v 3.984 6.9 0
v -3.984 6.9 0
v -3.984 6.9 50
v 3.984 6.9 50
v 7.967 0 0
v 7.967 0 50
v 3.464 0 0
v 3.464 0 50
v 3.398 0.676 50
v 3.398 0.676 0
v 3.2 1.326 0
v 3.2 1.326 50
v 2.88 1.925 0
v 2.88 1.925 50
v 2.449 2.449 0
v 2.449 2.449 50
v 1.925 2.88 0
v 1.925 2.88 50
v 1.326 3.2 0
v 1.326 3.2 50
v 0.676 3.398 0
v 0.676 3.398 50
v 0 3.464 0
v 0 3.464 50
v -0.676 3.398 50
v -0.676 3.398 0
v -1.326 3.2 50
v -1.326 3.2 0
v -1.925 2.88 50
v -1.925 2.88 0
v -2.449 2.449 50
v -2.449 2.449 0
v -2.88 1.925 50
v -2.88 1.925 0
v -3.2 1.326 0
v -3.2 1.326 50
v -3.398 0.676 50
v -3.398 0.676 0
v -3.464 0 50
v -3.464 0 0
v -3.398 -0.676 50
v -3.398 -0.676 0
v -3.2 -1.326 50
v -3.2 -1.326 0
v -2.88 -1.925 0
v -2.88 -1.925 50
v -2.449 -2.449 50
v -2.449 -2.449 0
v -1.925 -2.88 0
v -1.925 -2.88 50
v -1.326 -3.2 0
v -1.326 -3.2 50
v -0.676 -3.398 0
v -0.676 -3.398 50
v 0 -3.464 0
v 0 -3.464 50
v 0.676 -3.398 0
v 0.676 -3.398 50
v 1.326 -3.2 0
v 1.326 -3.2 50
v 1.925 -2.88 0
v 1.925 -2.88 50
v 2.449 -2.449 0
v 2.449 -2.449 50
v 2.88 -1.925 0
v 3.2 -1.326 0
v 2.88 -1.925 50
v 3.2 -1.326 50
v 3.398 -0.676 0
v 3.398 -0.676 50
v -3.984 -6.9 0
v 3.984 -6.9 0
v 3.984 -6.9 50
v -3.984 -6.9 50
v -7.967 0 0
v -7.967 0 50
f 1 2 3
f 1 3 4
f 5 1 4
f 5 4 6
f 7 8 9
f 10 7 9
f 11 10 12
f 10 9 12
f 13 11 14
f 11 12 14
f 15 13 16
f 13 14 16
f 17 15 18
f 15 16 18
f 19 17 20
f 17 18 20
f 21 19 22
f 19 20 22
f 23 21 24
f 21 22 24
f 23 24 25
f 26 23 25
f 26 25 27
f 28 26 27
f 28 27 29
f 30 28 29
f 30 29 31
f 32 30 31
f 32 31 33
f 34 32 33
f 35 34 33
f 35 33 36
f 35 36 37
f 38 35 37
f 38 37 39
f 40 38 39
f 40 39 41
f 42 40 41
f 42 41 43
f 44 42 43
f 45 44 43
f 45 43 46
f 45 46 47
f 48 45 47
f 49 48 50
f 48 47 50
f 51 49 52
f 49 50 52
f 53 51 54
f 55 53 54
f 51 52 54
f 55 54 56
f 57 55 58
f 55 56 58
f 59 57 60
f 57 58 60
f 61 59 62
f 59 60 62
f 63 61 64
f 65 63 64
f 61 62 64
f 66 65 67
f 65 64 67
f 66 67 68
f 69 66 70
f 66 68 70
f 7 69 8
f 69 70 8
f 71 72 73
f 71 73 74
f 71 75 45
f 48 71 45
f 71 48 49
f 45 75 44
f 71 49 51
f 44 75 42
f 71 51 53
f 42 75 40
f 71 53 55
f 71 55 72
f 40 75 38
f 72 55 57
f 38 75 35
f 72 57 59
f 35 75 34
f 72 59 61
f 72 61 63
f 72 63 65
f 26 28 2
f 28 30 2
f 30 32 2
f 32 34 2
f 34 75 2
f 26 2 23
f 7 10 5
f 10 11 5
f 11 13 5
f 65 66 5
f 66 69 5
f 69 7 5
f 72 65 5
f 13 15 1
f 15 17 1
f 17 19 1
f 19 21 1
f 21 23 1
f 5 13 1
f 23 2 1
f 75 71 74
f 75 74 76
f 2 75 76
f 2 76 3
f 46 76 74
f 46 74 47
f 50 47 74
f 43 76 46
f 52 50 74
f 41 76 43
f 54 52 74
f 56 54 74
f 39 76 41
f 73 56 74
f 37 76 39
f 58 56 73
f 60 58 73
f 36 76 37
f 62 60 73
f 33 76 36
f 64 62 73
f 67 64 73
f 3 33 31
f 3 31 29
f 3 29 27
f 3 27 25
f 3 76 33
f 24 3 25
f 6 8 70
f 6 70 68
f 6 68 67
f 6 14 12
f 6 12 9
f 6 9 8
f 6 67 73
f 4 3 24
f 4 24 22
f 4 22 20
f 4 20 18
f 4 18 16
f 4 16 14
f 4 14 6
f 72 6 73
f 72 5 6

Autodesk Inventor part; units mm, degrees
ref_plane "YZ Plane" through (0, 0, 0) normal (1, 0, 0) x (0, 1, 0)
ref_plane "XZ Plane" through (0, 0, 0) normal (0, 1, 0) x (-1, 0, 0)
ref_plane "XY Plane" through (0, 0, 0) normal (0, 0, 1) x (1, 0, 0)
sketch "Sketch1" plane through (0, 0, 0) normal (0, 0, 1) x (1, 0, 0)
  line L0 (7.9674, 0) -> (3.9837, -6.9)
  line L1 (3.9837, -6.9) -> (-3.9837, -6.9)
  line L2 (-3.9837, -6.9) -> (-7.9674, 0)
  line L3 (-7.9674, 0) -> (-3.9837, 6.9)
  line L4 (-3.9837, 6.9) -> (3.9837, 6.9)
  line L5 (3.9837, 6.9) -> (7.9674, 0)
  line L6 (3.4641, 0) -> (1.7321, -3)
  line L7 (1.7321, -3) -> (-1.7321, -3)
  line L8 (-1.7321, -3) -> (-3.4641, 0)
  line L9 (-3.4641, 0) -> (-1.7321, 3)
  line L10 (-1.7321, 3) -> (1.7321, 3)
  line L11 (1.7321, 3) -> (3.4641, 0)
  point P0 (0, 0)
  point P1 (0, 0)
  point P2 (0, 0)
  dimension "d0" = 13.8
  dimension "d1" = 6
extrude "Extrusion1" add sketch "Sketch1" along normal blind 50
sketch "Sketch2" plane through (0, 0, 50) normal (0, 0, 1) x (1, 0, 0)
  line L0 (1.7321, -3) -> (-1.7321, -3) projected
  circle A0 centre (0, 0) radius 3.4641
extrude "Extrusion2" cut sketch "Sketch2" against normal blind 50
properties part number "Montaje Manguera"
